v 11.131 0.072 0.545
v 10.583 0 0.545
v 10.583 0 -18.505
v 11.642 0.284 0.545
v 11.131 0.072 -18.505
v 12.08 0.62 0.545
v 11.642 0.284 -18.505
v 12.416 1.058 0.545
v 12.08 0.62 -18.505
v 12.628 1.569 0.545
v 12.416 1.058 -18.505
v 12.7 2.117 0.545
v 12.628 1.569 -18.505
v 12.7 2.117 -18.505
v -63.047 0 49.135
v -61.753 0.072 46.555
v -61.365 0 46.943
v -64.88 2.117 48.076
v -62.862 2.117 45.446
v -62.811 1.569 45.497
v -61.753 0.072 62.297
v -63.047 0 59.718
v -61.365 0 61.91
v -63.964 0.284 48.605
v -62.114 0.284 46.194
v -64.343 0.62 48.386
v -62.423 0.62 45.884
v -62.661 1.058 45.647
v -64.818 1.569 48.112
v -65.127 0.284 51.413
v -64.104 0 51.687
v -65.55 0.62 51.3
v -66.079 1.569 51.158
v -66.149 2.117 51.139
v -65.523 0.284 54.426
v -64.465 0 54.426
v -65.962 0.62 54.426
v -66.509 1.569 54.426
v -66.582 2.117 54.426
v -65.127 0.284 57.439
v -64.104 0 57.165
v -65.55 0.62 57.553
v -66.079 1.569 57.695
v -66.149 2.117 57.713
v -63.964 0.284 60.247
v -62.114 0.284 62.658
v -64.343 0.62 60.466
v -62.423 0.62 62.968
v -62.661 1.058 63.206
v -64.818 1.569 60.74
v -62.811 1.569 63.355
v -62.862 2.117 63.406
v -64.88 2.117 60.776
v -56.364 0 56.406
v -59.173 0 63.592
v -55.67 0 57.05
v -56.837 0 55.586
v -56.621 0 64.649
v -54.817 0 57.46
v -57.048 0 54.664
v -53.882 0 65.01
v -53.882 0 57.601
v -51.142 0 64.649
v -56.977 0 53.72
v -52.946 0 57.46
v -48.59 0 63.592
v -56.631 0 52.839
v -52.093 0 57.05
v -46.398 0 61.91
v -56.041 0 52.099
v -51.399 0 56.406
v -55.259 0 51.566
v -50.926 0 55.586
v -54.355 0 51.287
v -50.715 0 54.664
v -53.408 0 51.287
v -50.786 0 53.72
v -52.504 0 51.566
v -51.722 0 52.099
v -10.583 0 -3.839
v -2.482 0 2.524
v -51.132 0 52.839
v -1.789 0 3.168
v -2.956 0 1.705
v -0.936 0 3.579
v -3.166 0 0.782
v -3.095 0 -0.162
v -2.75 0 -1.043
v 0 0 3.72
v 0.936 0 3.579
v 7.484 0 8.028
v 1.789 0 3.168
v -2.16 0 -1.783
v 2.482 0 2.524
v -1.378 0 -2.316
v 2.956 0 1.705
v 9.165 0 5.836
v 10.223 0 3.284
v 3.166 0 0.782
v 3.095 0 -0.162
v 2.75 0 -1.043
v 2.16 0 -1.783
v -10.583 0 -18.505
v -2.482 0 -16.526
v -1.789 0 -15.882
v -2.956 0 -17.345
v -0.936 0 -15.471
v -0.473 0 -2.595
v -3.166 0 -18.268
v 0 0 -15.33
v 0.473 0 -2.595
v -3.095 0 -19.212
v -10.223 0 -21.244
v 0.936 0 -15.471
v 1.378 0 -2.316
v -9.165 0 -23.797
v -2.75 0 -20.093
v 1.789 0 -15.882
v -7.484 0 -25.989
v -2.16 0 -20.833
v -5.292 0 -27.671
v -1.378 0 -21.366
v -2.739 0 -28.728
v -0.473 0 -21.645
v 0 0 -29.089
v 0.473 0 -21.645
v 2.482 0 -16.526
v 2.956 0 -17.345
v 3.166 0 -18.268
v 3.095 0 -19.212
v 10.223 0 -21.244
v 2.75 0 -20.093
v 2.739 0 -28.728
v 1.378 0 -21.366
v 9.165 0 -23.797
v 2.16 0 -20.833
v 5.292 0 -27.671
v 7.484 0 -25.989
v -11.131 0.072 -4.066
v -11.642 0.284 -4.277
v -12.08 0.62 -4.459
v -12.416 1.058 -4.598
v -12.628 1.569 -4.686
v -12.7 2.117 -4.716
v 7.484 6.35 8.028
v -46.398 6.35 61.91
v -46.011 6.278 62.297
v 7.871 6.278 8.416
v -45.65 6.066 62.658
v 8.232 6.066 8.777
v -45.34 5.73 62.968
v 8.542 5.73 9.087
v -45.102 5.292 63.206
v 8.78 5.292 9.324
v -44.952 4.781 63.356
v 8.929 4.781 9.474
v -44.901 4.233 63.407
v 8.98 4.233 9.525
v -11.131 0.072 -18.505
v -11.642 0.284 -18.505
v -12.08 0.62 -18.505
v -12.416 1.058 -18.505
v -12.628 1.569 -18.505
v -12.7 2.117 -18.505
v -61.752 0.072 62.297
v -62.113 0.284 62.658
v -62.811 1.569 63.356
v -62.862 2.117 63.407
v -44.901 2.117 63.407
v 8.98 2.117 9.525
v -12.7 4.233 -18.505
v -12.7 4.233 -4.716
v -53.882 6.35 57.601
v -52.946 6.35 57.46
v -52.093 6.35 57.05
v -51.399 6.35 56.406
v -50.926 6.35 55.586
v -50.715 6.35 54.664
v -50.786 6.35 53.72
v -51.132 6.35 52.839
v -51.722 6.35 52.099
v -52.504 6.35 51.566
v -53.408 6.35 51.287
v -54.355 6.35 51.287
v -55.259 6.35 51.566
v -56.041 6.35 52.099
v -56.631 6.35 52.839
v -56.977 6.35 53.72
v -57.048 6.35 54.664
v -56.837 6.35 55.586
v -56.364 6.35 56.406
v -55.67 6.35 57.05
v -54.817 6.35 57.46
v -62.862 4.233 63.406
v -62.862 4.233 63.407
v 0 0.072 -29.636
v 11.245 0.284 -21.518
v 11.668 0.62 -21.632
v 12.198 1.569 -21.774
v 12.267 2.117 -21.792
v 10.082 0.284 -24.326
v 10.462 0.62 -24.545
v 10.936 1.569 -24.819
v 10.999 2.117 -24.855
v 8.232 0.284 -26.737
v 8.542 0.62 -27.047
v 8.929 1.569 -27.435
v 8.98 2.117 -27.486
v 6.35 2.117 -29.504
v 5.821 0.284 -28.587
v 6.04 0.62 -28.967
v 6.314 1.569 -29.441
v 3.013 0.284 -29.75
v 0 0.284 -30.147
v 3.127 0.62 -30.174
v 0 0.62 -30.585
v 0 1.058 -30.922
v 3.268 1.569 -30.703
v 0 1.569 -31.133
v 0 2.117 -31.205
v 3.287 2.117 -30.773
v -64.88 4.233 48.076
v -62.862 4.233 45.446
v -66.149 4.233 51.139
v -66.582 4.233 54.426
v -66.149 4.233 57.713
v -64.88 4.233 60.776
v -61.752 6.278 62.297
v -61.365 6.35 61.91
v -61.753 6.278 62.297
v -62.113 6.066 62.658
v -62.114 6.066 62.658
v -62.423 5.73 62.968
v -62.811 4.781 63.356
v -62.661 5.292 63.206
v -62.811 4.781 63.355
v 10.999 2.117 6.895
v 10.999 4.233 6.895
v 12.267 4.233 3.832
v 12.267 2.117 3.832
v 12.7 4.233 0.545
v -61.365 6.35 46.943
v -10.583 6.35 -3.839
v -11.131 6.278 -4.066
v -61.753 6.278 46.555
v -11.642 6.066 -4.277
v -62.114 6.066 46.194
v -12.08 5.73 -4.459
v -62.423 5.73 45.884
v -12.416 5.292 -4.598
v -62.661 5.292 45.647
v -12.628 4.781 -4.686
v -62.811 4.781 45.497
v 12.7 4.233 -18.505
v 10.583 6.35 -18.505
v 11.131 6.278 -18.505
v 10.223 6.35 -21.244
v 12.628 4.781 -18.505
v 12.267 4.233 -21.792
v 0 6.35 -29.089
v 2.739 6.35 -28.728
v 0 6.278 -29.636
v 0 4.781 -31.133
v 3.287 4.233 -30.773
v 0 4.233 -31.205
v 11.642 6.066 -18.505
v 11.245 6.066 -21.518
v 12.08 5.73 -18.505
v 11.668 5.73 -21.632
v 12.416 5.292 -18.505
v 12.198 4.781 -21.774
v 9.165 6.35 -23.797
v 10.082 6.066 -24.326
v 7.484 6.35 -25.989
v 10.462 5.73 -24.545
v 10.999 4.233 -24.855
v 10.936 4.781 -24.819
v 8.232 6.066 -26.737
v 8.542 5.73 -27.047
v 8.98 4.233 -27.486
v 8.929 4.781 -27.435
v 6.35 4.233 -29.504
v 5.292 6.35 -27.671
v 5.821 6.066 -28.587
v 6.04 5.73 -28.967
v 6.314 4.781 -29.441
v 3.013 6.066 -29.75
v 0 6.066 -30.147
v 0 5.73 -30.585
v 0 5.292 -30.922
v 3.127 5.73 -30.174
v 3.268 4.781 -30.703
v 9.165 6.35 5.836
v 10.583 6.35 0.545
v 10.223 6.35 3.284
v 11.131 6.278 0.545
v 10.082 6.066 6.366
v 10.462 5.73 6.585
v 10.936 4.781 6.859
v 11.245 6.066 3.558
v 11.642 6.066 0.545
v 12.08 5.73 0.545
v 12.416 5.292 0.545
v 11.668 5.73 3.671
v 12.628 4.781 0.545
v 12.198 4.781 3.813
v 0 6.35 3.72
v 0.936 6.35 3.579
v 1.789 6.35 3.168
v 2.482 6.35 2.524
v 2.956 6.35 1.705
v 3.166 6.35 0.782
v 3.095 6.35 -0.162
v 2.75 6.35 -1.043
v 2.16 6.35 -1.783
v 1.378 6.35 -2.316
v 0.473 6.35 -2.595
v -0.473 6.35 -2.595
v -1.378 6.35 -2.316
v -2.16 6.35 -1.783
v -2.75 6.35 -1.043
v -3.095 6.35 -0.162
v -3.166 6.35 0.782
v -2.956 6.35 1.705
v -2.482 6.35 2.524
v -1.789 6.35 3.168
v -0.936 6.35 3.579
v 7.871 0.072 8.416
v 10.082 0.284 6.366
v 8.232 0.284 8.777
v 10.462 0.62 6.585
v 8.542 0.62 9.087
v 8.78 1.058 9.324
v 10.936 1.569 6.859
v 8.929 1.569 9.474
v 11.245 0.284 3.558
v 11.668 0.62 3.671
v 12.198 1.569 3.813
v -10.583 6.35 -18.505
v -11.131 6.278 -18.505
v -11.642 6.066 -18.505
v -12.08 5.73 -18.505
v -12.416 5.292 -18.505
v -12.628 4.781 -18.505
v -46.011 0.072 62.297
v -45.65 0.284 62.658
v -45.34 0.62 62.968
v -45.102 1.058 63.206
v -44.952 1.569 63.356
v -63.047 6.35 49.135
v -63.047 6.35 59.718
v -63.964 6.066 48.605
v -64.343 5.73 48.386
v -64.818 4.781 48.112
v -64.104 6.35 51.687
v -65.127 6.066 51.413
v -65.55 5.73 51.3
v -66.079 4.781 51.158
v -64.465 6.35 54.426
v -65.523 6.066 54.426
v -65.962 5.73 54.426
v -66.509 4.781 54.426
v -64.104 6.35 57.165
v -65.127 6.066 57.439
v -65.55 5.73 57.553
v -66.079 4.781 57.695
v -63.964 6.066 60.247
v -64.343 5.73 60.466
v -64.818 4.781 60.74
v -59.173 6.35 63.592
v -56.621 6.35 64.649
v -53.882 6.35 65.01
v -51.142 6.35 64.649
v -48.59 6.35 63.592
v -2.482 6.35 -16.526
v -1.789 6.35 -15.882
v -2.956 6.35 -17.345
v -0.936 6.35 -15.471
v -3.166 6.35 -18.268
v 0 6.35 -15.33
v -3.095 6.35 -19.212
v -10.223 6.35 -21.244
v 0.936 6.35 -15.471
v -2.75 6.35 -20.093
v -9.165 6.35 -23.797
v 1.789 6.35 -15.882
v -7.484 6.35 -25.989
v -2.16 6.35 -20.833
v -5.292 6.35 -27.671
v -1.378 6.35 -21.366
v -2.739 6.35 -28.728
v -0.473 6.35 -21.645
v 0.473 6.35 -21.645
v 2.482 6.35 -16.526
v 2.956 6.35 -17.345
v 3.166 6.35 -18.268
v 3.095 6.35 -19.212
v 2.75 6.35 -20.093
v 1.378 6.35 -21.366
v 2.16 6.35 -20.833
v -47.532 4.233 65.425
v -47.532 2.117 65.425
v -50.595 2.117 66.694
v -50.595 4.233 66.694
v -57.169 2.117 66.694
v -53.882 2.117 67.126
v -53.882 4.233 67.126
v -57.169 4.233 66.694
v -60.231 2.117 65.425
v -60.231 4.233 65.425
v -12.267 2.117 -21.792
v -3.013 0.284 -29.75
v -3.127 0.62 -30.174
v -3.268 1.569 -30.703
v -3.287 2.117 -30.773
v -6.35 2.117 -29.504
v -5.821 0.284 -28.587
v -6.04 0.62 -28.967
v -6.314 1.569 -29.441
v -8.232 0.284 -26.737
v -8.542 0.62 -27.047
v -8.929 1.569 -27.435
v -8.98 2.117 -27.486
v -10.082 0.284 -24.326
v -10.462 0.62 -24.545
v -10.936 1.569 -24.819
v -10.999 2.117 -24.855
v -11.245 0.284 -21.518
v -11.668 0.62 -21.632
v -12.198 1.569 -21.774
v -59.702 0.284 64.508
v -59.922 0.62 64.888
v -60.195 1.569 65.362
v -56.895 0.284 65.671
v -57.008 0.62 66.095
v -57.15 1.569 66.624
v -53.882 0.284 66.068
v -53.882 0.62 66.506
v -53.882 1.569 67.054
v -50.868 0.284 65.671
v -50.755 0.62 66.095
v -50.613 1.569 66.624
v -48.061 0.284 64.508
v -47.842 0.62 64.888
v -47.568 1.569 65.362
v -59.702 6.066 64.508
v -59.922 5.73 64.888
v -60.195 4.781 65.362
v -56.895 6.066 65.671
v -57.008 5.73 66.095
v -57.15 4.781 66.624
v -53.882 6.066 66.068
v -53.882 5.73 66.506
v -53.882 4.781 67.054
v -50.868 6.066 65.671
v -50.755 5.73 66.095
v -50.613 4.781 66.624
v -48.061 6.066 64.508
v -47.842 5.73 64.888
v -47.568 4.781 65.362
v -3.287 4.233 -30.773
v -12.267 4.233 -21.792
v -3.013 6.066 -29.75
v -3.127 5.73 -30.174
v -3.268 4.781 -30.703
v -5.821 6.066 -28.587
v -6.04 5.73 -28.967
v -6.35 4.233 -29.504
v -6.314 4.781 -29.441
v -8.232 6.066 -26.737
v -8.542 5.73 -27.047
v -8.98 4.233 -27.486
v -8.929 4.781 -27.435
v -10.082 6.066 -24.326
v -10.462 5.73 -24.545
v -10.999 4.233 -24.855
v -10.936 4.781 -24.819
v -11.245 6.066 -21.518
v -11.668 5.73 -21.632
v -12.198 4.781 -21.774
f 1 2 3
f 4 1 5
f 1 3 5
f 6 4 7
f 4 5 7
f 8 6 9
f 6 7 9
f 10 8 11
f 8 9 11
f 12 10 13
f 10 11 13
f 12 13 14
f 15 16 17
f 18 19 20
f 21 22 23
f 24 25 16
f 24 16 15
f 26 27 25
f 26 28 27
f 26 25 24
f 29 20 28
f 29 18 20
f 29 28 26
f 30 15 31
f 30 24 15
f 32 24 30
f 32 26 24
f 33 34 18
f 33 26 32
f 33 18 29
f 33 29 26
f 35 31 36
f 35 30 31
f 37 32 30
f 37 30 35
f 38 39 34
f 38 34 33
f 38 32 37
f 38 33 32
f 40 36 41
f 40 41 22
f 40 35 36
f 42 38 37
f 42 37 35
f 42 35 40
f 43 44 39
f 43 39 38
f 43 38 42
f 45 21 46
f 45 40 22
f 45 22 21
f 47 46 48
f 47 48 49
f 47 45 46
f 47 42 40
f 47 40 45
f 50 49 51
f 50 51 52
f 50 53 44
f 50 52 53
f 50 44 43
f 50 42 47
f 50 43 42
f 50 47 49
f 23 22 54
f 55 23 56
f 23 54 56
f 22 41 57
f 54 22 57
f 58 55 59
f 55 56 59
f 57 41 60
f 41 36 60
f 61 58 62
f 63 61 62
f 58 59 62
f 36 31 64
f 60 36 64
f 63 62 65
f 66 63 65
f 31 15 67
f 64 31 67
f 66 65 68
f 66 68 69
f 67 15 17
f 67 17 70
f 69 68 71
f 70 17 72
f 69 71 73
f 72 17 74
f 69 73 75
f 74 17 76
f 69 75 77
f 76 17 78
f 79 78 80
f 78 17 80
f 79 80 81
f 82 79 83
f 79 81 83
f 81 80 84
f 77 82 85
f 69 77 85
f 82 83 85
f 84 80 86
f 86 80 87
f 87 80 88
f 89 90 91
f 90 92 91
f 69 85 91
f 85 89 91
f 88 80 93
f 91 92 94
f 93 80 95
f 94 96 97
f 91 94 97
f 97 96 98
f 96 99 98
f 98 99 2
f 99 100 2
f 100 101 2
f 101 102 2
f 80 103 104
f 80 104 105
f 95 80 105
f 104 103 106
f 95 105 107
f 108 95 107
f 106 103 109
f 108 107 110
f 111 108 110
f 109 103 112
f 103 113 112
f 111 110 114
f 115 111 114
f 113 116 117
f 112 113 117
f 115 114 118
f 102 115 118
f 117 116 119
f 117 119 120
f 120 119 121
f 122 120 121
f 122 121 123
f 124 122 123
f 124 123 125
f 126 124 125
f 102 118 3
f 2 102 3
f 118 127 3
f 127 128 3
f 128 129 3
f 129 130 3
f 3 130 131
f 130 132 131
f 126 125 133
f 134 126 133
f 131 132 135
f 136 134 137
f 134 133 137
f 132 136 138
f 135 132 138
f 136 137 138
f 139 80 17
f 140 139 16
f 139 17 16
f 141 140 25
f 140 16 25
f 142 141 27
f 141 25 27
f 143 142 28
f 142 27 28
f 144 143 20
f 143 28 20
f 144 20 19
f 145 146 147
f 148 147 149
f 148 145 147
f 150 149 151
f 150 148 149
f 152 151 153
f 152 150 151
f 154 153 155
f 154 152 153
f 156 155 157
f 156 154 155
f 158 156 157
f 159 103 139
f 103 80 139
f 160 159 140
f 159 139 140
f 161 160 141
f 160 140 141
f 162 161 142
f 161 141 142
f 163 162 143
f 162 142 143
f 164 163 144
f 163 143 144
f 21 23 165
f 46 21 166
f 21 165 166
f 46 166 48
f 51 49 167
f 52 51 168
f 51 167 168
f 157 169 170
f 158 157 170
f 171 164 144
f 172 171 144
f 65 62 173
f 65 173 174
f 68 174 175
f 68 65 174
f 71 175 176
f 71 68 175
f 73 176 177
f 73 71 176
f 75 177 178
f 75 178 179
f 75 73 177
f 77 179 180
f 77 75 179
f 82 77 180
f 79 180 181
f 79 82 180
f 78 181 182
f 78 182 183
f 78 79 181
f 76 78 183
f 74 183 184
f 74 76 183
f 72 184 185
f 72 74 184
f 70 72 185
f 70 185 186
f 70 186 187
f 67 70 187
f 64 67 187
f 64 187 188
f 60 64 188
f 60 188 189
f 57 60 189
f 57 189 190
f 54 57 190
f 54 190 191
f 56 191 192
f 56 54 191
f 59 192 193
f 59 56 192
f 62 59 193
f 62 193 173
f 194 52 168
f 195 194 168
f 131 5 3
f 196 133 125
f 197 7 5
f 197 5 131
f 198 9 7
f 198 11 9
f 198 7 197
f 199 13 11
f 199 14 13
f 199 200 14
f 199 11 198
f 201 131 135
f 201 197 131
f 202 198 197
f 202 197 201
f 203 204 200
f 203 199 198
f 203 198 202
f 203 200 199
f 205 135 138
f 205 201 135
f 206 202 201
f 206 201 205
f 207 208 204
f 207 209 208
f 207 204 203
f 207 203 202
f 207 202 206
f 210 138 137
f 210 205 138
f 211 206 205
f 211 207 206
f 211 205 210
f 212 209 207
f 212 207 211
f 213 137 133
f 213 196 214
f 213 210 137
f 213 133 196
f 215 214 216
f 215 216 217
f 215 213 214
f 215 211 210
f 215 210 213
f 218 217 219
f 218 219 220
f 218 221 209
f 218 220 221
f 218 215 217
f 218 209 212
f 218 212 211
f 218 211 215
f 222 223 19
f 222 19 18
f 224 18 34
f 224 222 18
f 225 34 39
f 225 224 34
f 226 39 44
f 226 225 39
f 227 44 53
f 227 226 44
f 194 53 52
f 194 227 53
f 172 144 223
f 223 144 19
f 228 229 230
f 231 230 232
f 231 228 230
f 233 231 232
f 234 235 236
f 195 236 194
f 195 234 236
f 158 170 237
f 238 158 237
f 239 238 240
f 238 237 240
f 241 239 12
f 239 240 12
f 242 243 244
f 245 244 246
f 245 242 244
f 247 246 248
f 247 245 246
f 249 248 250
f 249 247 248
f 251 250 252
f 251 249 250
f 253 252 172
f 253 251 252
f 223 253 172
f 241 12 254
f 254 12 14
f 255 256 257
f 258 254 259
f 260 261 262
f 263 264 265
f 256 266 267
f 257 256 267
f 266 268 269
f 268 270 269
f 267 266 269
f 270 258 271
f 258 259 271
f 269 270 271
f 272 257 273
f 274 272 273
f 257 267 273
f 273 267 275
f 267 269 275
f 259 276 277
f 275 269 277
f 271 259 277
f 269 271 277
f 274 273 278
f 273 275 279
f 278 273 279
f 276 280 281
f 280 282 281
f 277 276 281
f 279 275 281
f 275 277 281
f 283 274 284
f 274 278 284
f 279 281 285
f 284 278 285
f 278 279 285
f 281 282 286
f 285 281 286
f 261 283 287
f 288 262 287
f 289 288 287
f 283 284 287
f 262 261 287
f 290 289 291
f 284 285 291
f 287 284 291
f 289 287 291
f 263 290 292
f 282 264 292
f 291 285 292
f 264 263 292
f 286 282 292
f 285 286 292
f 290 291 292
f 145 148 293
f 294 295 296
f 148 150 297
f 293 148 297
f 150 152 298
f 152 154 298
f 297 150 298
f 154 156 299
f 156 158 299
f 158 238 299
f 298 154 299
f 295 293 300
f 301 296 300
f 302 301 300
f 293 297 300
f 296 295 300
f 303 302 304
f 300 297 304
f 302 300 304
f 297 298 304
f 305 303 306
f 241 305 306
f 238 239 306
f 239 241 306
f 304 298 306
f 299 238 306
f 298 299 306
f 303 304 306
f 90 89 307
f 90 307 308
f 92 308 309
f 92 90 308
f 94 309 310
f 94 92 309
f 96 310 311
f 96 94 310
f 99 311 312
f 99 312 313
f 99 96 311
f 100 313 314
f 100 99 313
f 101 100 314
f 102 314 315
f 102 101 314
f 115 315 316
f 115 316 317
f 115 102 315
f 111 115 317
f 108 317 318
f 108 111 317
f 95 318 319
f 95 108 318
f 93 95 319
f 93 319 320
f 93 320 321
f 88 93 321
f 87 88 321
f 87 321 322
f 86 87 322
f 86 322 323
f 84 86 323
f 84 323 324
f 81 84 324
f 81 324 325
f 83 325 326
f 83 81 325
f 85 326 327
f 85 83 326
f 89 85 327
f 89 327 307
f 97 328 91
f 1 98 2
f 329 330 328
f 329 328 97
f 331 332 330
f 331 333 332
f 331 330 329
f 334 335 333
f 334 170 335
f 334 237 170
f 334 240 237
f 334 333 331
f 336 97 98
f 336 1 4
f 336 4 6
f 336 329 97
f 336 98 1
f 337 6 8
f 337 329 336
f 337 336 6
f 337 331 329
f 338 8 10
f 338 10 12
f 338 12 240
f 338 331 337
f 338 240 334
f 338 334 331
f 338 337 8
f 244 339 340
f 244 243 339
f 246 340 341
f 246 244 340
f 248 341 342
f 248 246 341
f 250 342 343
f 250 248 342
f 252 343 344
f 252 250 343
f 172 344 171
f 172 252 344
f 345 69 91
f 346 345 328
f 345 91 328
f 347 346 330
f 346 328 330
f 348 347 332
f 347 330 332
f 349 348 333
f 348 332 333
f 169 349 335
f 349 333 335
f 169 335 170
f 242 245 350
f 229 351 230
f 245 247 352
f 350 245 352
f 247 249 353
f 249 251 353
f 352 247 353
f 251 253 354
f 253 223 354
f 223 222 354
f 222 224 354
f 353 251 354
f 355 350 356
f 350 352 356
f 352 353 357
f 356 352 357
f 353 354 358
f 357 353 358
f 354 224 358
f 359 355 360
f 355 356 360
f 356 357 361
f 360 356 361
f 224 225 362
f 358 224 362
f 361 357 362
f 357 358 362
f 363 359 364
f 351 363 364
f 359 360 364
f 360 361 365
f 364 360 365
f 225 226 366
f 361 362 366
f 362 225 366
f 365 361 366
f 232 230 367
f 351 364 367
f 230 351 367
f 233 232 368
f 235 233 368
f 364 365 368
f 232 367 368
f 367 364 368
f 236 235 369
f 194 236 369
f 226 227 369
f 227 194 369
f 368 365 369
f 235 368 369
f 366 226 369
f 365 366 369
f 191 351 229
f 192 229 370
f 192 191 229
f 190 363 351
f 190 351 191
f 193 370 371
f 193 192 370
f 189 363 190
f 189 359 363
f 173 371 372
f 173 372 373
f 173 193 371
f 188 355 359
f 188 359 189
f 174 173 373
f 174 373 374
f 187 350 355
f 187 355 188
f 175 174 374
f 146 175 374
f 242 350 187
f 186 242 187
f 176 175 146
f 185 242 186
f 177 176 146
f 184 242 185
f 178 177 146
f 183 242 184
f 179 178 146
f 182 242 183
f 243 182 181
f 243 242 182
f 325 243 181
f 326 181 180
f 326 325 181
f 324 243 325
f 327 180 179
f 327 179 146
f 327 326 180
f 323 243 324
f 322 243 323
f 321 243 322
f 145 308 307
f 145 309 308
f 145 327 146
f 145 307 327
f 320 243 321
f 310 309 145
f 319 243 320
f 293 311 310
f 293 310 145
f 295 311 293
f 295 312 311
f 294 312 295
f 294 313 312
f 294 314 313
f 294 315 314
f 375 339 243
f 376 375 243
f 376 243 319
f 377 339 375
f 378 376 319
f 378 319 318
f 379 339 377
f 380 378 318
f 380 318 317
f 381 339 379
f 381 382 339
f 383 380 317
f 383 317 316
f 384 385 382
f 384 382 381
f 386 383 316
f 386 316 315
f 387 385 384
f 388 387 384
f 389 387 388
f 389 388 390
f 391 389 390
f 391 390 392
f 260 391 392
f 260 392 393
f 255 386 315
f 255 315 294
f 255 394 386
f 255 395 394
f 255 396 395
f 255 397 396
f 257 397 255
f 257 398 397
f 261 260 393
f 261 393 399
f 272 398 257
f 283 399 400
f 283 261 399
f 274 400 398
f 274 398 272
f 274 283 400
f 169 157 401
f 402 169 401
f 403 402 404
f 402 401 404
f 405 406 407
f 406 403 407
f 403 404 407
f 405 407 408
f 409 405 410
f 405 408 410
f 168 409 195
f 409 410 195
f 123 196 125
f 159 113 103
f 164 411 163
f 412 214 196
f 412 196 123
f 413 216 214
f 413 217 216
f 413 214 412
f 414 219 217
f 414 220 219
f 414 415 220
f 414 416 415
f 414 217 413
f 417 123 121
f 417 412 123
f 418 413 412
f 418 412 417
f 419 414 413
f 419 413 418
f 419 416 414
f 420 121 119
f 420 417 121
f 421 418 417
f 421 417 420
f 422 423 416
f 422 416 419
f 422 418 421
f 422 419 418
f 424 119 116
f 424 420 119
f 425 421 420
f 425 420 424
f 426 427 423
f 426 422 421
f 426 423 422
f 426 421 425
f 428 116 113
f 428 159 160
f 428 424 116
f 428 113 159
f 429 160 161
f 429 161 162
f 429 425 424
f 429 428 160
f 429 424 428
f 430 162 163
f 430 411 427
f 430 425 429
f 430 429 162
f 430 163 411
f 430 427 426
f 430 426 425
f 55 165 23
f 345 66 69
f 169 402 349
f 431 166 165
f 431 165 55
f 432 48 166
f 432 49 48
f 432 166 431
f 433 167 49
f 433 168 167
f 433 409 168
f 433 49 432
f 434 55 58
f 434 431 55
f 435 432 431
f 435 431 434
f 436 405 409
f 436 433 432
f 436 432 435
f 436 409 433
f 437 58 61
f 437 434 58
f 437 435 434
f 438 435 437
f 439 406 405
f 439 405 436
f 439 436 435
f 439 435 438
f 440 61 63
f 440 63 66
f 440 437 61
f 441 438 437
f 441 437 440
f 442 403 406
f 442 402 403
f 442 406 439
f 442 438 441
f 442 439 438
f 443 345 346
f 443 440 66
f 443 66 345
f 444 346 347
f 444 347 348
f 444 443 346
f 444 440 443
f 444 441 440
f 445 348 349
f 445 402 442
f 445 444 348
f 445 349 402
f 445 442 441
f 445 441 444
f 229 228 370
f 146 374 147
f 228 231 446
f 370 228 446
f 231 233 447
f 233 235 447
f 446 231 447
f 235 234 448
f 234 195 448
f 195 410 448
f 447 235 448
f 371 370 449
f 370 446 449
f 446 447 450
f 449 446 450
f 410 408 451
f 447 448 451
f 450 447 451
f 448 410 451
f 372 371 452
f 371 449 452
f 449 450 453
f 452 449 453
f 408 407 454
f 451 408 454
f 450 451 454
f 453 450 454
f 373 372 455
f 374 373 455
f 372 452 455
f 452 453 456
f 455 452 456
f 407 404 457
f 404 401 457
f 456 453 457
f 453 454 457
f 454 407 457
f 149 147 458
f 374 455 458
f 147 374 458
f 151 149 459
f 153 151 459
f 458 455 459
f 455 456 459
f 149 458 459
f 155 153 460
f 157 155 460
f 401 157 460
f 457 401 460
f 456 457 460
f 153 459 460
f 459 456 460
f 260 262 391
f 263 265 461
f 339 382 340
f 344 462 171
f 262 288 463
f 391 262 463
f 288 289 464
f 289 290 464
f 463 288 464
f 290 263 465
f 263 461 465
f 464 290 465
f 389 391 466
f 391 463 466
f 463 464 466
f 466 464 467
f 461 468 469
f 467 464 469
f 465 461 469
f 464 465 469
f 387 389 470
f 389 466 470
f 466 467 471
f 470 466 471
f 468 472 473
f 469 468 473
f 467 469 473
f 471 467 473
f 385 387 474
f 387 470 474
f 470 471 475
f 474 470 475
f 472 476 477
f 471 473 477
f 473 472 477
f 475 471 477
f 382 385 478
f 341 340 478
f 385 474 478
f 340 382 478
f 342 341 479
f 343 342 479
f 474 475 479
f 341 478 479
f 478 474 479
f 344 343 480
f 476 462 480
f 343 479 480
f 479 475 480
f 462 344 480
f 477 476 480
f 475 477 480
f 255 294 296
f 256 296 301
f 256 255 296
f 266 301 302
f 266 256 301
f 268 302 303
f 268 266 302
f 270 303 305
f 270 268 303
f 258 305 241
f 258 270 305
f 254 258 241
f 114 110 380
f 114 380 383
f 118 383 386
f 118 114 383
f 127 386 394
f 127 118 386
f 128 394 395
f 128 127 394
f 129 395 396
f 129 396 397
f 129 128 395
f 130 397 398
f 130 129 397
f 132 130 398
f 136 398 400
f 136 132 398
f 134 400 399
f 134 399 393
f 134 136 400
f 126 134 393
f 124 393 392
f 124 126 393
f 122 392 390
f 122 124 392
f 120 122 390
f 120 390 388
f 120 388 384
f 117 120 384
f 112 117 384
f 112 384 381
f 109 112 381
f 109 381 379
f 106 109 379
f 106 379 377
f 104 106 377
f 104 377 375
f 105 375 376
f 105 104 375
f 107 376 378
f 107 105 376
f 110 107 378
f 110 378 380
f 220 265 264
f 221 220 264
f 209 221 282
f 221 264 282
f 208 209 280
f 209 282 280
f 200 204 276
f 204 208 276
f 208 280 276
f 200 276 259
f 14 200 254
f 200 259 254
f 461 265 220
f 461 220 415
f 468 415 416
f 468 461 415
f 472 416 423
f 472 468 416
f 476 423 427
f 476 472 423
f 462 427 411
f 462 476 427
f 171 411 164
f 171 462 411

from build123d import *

# Parameters (mm, degrees)
SKETCH1_R           = 3.175
BOSS_EXTRUDE1_DEPTH = 6.35
FILLET2_R           = 12.7
FILLET3_R           = 2.116666667


with BuildPart() as part:
    # Sketch1 → Boss-Extrude1 (new body)
    with BuildSketch(Plane(origin=(0, 0, 0), x_dir=(1, 0, 0), z_dir=(0, 1, 0))):
        with BuildLine():
            Line((12.7, 31.205256121), (-12.7, 31.205256121))
            Line((-12.7, 31.205256121), (-12.7, 4.715768363))
            Line((-12.7, 4.715768363), (-71.842048969, -54.426280605))
            Line((-71.842048969, -54.426280605), (-53.881536726, -72.386792847))
            Line((-53.881536726, -72.386792847), (8.980256121, -9.525))
            ThreePointArc((8.980256121, -9.525), (11.733270063, -5.40482347), (12.7, -0.544743879))
            Line((12.7, -0.544743879), (12.7, 31.205256121))
        make_face()
        with Locations(Location((-53.881536726, -54.426280605, 0), (0, 0, 270))):
            Circle(SKETCH1_R, mode=Mode.SUBTRACT)
        with Locations(Location((0, -0.544743879, 0), (0, 0, 270))):
            Circle(SKETCH1_R, mode=Mode.SUBTRACT)
        with Locations(Location((0, 18.505256121, 0), (0, 0, 270))):
            Circle(SKETCH1_R, mode=Mode.SUBTRACT)
    extrude(amount=BOSS_EXTRUDE1_DEPTH)

    # Fillet2
    fillet2_edges = [part.edges().sort_by_distance(p)[0] for p in [
        (12.7, 3.175, -31.205256121),
        (-12.7, 3.175, -31.205256121),
        (-71.842048969, 3.175, 54.426280605),
        (-53.881536726, 3.175, 72.386792847),
    ]]
    fillet(fillet2_edges, radius=FILLET2_R - 0.0001)  # a hair under: the kernel refuses the full size

    # Fillet3
    fillet3_edges = [part.edges().sort_by_distance(p)[0] for p in [
        (11.733270063, 6.35, 5.40482347),
        (-37.780931779, 0, 20.365163416),
        (-12.7, 0, -11.610562242),
        (12.7, 0, -8.980306121),
        (11.733270063, 0, 5.40482347),
        (12.7, 6.35, -8.980306121),
        (-12.7, 6.35, -11.610562242),
        (-37.780931779, 6.35, 20.365163416),
        (-17.960547597, 0, 36.465803719),
        (-53.881536726, 0, 67.126322027),
        (-66.581578148, 0, 54.426280605),
        (-8.98028541, 0, -27.485541531),
        (8.98028541, 0, -27.485541531),
        (-17.960547597, 6.35, 36.465803719),
        (-53.881536726, 6.35, 67.126322027),
        (-66.581578148, 6.35, 54.426280605),
        (-8.98028541, 6.35, -27.485541531),
        (8.98028541, 6.35, -27.485541531),
    ]]
    fillet(fillet3_edges, radius=FILLET3_R)


solid = part.part
